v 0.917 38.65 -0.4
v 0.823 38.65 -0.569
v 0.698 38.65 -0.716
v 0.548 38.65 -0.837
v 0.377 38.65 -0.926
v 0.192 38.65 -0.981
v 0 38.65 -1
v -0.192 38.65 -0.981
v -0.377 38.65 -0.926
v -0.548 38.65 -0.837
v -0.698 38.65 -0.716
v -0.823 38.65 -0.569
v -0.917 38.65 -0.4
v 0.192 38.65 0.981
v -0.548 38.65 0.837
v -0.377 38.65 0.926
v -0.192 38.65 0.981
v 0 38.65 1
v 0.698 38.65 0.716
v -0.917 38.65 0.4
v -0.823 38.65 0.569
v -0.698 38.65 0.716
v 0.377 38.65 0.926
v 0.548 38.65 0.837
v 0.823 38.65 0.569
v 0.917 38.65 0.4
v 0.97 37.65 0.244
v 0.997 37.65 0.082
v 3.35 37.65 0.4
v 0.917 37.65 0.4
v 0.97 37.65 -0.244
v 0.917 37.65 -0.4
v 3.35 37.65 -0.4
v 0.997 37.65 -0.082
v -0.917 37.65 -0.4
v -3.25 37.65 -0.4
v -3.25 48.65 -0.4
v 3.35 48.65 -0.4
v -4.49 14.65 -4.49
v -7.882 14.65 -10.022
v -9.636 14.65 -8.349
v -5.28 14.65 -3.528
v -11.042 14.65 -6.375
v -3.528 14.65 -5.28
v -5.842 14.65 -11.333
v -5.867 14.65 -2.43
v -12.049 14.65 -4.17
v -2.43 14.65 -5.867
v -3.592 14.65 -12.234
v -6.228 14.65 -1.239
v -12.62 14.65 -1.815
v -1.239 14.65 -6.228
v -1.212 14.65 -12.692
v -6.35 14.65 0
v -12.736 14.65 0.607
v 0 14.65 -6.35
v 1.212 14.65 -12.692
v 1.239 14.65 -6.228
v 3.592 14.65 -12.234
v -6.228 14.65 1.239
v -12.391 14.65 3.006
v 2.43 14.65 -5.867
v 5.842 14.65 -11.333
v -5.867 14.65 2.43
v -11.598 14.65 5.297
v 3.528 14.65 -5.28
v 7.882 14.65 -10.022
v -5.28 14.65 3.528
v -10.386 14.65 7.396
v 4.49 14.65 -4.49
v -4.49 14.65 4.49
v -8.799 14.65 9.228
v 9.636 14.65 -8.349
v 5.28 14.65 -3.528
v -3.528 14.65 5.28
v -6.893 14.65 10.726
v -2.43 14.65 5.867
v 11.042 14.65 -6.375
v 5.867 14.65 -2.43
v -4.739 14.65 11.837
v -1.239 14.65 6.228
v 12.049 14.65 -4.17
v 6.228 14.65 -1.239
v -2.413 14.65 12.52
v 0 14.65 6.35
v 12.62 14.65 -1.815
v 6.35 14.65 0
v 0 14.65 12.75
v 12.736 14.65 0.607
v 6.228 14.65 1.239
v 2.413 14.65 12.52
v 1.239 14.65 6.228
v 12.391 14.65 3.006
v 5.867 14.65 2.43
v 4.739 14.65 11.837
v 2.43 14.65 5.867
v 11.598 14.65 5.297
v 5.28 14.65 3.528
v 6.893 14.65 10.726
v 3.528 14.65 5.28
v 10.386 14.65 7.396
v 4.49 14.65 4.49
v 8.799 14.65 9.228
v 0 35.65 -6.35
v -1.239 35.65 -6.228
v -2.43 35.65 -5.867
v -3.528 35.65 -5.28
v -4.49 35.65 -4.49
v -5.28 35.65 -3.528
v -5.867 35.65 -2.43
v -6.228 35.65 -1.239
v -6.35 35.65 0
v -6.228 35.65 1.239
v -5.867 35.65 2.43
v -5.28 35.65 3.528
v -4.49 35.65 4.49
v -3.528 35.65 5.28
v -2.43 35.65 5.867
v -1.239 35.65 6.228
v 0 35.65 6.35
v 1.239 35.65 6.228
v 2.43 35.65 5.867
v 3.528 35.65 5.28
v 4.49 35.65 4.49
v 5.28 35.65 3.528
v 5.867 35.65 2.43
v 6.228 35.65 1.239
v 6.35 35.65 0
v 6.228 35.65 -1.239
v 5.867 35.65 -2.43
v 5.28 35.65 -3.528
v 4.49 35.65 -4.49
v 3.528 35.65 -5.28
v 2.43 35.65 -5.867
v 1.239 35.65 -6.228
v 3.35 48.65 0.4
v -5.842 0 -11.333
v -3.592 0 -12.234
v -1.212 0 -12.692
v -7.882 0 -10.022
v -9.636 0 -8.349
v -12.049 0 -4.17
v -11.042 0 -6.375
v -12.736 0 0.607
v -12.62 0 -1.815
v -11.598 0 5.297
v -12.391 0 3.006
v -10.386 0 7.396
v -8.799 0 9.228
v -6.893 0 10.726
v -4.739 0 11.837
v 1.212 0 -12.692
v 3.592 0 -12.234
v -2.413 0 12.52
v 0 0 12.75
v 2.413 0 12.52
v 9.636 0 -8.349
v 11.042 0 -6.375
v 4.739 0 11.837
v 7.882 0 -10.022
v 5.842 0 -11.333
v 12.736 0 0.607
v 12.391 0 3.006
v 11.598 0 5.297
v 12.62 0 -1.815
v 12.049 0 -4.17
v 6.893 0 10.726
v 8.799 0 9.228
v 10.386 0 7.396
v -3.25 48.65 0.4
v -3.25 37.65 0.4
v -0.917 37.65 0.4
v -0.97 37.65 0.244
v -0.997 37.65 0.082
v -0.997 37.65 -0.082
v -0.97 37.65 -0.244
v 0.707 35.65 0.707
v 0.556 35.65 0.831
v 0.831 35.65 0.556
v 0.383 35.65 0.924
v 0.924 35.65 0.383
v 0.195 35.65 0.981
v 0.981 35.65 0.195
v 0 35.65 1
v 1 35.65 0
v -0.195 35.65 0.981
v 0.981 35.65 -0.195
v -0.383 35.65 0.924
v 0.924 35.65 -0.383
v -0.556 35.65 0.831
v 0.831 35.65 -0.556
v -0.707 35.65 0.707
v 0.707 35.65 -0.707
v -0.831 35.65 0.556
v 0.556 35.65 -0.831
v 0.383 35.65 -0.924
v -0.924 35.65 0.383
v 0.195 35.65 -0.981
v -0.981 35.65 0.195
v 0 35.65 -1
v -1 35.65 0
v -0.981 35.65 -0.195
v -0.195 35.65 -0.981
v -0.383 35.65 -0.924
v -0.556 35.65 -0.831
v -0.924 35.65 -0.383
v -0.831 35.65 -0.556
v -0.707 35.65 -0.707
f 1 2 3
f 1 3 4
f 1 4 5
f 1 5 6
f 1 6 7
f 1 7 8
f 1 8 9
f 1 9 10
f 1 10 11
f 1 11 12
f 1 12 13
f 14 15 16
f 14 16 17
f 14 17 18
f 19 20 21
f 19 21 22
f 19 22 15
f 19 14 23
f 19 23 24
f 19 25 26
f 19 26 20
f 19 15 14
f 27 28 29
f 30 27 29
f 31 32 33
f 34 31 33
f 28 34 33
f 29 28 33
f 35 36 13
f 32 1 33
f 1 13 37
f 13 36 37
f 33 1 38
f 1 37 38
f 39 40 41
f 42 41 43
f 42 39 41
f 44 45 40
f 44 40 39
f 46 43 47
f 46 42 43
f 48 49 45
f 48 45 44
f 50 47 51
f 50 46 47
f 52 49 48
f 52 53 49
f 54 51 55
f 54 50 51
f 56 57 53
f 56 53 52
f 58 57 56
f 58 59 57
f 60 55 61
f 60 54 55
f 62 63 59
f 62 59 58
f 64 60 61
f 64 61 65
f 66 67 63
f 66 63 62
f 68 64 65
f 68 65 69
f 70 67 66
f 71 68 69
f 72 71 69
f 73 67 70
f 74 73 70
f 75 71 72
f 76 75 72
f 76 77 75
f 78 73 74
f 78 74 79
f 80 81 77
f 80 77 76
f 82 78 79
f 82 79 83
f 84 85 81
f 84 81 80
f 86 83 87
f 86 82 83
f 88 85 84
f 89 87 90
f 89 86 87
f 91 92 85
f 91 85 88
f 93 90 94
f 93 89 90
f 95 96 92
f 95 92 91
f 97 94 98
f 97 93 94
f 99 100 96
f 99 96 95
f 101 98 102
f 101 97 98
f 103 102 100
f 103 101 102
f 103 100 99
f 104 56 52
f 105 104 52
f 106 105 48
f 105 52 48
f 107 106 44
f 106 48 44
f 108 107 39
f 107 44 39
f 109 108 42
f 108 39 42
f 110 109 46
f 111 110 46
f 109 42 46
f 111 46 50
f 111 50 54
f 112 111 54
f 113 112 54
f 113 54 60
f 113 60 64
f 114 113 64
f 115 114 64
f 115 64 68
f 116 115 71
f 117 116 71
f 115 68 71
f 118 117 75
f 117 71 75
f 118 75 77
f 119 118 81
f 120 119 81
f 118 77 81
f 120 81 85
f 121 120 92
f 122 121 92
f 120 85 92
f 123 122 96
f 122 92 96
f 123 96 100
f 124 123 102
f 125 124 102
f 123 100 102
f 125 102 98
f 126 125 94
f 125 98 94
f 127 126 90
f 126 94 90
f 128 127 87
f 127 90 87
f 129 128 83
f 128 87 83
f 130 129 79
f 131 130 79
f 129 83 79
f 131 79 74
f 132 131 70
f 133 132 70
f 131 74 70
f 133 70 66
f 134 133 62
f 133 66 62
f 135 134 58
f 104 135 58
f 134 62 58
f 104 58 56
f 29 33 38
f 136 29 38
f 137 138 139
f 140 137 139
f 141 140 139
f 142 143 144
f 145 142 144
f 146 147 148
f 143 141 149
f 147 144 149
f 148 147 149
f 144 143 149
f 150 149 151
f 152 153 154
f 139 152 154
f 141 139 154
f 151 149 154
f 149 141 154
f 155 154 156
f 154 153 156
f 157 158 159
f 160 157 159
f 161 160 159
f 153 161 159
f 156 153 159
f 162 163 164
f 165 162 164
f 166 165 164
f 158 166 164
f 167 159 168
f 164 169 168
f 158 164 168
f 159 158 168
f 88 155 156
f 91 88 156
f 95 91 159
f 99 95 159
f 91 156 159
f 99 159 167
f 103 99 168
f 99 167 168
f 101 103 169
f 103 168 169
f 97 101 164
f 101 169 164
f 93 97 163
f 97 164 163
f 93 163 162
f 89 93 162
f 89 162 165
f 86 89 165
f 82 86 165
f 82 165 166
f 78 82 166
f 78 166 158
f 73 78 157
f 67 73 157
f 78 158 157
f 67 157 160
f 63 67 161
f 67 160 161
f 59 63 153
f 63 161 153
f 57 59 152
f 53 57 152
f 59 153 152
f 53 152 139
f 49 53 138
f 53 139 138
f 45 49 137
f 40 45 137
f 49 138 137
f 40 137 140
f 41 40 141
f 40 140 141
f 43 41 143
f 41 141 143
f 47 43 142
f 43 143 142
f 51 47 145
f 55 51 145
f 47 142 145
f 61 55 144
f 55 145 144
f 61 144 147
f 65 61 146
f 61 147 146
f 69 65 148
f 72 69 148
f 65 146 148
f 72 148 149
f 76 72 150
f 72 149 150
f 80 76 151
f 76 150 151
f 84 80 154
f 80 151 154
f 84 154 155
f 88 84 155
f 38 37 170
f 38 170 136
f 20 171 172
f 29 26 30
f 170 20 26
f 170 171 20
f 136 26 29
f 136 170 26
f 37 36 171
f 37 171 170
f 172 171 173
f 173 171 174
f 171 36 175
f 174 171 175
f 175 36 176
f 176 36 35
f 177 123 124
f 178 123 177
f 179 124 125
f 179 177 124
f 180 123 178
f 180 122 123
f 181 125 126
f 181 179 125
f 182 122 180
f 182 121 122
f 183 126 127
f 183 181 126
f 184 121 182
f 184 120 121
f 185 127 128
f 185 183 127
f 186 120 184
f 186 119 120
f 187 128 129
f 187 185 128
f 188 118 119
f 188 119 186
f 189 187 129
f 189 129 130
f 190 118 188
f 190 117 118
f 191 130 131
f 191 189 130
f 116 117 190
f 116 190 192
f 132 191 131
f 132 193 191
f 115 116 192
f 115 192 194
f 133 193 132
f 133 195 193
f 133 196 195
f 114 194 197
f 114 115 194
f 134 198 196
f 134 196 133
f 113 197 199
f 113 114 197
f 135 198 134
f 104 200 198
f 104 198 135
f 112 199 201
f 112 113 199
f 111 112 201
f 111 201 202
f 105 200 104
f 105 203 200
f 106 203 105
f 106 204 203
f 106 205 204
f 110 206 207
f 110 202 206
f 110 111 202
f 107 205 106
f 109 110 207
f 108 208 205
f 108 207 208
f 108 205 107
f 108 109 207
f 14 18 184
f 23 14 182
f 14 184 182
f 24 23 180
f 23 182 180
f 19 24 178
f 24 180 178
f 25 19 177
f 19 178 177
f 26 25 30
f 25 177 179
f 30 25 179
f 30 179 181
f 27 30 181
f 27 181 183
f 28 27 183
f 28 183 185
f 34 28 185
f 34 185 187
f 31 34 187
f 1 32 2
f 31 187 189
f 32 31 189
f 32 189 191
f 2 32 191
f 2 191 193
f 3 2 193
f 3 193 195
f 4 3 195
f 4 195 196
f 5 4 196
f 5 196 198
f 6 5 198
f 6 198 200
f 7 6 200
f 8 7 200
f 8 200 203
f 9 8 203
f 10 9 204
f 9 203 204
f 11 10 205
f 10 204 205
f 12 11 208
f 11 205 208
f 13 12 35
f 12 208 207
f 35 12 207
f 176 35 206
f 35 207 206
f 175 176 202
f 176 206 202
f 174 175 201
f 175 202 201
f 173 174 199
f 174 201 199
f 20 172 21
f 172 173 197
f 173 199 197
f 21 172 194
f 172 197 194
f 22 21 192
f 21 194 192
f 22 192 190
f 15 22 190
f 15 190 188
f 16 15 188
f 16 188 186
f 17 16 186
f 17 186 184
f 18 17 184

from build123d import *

# Parameters (mm, degrees)
SKETCH_1_R           = 12.75
EXTRUDE_1_DEPTH      = 14.65
SKETCH_2_R           = 6.35
EXTRUDE_2_DEPTH      = 21
SKETCH_3_R           = 1
EXTRUDE_3_DEPTH      = 3
EXTRUDE_4_DEPTH      = 0.4
EXTRUDE_4_DEPTH_BACK = 0.4
SKETCH_4_W           = 6.6
SKETCH_4_H           = 11


with BuildPart() as part:
    # 草图1 → 凸台-拉伸1 (new body)
    with BuildSketch(Plane(origin=(0, 0, 0), x_dir=(1, 0, 0), z_dir=(0, 1, 0))):
        Circle(SKETCH_1_R)
    extrude(amount=EXTRUDE_1_DEPTH)

    # 草图2 → 凸台-拉伸2 (add)
    with BuildSketch(Plane(origin=(0, 14.65, 0), x_dir=(1, 0, 0), z_dir=(0, 1, 0))):
        Circle(SKETCH_2_R)
    extrude(amount=EXTRUDE_2_DEPTH)

    # 草图3 → 凸台-拉伸3 (add)
    with BuildSketch(Plane(origin=(0, 35.65, 0), x_dir=(1, 0, 0), z_dir=(0, 1, 0))):
        Circle(SKETCH_3_R)
    extrude(amount=EXTRUDE_3_DEPTH)

    # 草图4 → 凸台-拉伸4 (add, two sides: drawn at the far end of the back side and taken through both)
    with BuildSketch(Plane.XY.offset(-EXTRUDE_4_DEPTH_BACK)):
        with Locations((0.05, 43.15)):
            Rectangle(SKETCH_4_W, SKETCH_4_H)
    extrude(amount=EXTRUDE_4_DEPTH + EXTRUDE_4_DEPTH_BACK)


solid = part.part
